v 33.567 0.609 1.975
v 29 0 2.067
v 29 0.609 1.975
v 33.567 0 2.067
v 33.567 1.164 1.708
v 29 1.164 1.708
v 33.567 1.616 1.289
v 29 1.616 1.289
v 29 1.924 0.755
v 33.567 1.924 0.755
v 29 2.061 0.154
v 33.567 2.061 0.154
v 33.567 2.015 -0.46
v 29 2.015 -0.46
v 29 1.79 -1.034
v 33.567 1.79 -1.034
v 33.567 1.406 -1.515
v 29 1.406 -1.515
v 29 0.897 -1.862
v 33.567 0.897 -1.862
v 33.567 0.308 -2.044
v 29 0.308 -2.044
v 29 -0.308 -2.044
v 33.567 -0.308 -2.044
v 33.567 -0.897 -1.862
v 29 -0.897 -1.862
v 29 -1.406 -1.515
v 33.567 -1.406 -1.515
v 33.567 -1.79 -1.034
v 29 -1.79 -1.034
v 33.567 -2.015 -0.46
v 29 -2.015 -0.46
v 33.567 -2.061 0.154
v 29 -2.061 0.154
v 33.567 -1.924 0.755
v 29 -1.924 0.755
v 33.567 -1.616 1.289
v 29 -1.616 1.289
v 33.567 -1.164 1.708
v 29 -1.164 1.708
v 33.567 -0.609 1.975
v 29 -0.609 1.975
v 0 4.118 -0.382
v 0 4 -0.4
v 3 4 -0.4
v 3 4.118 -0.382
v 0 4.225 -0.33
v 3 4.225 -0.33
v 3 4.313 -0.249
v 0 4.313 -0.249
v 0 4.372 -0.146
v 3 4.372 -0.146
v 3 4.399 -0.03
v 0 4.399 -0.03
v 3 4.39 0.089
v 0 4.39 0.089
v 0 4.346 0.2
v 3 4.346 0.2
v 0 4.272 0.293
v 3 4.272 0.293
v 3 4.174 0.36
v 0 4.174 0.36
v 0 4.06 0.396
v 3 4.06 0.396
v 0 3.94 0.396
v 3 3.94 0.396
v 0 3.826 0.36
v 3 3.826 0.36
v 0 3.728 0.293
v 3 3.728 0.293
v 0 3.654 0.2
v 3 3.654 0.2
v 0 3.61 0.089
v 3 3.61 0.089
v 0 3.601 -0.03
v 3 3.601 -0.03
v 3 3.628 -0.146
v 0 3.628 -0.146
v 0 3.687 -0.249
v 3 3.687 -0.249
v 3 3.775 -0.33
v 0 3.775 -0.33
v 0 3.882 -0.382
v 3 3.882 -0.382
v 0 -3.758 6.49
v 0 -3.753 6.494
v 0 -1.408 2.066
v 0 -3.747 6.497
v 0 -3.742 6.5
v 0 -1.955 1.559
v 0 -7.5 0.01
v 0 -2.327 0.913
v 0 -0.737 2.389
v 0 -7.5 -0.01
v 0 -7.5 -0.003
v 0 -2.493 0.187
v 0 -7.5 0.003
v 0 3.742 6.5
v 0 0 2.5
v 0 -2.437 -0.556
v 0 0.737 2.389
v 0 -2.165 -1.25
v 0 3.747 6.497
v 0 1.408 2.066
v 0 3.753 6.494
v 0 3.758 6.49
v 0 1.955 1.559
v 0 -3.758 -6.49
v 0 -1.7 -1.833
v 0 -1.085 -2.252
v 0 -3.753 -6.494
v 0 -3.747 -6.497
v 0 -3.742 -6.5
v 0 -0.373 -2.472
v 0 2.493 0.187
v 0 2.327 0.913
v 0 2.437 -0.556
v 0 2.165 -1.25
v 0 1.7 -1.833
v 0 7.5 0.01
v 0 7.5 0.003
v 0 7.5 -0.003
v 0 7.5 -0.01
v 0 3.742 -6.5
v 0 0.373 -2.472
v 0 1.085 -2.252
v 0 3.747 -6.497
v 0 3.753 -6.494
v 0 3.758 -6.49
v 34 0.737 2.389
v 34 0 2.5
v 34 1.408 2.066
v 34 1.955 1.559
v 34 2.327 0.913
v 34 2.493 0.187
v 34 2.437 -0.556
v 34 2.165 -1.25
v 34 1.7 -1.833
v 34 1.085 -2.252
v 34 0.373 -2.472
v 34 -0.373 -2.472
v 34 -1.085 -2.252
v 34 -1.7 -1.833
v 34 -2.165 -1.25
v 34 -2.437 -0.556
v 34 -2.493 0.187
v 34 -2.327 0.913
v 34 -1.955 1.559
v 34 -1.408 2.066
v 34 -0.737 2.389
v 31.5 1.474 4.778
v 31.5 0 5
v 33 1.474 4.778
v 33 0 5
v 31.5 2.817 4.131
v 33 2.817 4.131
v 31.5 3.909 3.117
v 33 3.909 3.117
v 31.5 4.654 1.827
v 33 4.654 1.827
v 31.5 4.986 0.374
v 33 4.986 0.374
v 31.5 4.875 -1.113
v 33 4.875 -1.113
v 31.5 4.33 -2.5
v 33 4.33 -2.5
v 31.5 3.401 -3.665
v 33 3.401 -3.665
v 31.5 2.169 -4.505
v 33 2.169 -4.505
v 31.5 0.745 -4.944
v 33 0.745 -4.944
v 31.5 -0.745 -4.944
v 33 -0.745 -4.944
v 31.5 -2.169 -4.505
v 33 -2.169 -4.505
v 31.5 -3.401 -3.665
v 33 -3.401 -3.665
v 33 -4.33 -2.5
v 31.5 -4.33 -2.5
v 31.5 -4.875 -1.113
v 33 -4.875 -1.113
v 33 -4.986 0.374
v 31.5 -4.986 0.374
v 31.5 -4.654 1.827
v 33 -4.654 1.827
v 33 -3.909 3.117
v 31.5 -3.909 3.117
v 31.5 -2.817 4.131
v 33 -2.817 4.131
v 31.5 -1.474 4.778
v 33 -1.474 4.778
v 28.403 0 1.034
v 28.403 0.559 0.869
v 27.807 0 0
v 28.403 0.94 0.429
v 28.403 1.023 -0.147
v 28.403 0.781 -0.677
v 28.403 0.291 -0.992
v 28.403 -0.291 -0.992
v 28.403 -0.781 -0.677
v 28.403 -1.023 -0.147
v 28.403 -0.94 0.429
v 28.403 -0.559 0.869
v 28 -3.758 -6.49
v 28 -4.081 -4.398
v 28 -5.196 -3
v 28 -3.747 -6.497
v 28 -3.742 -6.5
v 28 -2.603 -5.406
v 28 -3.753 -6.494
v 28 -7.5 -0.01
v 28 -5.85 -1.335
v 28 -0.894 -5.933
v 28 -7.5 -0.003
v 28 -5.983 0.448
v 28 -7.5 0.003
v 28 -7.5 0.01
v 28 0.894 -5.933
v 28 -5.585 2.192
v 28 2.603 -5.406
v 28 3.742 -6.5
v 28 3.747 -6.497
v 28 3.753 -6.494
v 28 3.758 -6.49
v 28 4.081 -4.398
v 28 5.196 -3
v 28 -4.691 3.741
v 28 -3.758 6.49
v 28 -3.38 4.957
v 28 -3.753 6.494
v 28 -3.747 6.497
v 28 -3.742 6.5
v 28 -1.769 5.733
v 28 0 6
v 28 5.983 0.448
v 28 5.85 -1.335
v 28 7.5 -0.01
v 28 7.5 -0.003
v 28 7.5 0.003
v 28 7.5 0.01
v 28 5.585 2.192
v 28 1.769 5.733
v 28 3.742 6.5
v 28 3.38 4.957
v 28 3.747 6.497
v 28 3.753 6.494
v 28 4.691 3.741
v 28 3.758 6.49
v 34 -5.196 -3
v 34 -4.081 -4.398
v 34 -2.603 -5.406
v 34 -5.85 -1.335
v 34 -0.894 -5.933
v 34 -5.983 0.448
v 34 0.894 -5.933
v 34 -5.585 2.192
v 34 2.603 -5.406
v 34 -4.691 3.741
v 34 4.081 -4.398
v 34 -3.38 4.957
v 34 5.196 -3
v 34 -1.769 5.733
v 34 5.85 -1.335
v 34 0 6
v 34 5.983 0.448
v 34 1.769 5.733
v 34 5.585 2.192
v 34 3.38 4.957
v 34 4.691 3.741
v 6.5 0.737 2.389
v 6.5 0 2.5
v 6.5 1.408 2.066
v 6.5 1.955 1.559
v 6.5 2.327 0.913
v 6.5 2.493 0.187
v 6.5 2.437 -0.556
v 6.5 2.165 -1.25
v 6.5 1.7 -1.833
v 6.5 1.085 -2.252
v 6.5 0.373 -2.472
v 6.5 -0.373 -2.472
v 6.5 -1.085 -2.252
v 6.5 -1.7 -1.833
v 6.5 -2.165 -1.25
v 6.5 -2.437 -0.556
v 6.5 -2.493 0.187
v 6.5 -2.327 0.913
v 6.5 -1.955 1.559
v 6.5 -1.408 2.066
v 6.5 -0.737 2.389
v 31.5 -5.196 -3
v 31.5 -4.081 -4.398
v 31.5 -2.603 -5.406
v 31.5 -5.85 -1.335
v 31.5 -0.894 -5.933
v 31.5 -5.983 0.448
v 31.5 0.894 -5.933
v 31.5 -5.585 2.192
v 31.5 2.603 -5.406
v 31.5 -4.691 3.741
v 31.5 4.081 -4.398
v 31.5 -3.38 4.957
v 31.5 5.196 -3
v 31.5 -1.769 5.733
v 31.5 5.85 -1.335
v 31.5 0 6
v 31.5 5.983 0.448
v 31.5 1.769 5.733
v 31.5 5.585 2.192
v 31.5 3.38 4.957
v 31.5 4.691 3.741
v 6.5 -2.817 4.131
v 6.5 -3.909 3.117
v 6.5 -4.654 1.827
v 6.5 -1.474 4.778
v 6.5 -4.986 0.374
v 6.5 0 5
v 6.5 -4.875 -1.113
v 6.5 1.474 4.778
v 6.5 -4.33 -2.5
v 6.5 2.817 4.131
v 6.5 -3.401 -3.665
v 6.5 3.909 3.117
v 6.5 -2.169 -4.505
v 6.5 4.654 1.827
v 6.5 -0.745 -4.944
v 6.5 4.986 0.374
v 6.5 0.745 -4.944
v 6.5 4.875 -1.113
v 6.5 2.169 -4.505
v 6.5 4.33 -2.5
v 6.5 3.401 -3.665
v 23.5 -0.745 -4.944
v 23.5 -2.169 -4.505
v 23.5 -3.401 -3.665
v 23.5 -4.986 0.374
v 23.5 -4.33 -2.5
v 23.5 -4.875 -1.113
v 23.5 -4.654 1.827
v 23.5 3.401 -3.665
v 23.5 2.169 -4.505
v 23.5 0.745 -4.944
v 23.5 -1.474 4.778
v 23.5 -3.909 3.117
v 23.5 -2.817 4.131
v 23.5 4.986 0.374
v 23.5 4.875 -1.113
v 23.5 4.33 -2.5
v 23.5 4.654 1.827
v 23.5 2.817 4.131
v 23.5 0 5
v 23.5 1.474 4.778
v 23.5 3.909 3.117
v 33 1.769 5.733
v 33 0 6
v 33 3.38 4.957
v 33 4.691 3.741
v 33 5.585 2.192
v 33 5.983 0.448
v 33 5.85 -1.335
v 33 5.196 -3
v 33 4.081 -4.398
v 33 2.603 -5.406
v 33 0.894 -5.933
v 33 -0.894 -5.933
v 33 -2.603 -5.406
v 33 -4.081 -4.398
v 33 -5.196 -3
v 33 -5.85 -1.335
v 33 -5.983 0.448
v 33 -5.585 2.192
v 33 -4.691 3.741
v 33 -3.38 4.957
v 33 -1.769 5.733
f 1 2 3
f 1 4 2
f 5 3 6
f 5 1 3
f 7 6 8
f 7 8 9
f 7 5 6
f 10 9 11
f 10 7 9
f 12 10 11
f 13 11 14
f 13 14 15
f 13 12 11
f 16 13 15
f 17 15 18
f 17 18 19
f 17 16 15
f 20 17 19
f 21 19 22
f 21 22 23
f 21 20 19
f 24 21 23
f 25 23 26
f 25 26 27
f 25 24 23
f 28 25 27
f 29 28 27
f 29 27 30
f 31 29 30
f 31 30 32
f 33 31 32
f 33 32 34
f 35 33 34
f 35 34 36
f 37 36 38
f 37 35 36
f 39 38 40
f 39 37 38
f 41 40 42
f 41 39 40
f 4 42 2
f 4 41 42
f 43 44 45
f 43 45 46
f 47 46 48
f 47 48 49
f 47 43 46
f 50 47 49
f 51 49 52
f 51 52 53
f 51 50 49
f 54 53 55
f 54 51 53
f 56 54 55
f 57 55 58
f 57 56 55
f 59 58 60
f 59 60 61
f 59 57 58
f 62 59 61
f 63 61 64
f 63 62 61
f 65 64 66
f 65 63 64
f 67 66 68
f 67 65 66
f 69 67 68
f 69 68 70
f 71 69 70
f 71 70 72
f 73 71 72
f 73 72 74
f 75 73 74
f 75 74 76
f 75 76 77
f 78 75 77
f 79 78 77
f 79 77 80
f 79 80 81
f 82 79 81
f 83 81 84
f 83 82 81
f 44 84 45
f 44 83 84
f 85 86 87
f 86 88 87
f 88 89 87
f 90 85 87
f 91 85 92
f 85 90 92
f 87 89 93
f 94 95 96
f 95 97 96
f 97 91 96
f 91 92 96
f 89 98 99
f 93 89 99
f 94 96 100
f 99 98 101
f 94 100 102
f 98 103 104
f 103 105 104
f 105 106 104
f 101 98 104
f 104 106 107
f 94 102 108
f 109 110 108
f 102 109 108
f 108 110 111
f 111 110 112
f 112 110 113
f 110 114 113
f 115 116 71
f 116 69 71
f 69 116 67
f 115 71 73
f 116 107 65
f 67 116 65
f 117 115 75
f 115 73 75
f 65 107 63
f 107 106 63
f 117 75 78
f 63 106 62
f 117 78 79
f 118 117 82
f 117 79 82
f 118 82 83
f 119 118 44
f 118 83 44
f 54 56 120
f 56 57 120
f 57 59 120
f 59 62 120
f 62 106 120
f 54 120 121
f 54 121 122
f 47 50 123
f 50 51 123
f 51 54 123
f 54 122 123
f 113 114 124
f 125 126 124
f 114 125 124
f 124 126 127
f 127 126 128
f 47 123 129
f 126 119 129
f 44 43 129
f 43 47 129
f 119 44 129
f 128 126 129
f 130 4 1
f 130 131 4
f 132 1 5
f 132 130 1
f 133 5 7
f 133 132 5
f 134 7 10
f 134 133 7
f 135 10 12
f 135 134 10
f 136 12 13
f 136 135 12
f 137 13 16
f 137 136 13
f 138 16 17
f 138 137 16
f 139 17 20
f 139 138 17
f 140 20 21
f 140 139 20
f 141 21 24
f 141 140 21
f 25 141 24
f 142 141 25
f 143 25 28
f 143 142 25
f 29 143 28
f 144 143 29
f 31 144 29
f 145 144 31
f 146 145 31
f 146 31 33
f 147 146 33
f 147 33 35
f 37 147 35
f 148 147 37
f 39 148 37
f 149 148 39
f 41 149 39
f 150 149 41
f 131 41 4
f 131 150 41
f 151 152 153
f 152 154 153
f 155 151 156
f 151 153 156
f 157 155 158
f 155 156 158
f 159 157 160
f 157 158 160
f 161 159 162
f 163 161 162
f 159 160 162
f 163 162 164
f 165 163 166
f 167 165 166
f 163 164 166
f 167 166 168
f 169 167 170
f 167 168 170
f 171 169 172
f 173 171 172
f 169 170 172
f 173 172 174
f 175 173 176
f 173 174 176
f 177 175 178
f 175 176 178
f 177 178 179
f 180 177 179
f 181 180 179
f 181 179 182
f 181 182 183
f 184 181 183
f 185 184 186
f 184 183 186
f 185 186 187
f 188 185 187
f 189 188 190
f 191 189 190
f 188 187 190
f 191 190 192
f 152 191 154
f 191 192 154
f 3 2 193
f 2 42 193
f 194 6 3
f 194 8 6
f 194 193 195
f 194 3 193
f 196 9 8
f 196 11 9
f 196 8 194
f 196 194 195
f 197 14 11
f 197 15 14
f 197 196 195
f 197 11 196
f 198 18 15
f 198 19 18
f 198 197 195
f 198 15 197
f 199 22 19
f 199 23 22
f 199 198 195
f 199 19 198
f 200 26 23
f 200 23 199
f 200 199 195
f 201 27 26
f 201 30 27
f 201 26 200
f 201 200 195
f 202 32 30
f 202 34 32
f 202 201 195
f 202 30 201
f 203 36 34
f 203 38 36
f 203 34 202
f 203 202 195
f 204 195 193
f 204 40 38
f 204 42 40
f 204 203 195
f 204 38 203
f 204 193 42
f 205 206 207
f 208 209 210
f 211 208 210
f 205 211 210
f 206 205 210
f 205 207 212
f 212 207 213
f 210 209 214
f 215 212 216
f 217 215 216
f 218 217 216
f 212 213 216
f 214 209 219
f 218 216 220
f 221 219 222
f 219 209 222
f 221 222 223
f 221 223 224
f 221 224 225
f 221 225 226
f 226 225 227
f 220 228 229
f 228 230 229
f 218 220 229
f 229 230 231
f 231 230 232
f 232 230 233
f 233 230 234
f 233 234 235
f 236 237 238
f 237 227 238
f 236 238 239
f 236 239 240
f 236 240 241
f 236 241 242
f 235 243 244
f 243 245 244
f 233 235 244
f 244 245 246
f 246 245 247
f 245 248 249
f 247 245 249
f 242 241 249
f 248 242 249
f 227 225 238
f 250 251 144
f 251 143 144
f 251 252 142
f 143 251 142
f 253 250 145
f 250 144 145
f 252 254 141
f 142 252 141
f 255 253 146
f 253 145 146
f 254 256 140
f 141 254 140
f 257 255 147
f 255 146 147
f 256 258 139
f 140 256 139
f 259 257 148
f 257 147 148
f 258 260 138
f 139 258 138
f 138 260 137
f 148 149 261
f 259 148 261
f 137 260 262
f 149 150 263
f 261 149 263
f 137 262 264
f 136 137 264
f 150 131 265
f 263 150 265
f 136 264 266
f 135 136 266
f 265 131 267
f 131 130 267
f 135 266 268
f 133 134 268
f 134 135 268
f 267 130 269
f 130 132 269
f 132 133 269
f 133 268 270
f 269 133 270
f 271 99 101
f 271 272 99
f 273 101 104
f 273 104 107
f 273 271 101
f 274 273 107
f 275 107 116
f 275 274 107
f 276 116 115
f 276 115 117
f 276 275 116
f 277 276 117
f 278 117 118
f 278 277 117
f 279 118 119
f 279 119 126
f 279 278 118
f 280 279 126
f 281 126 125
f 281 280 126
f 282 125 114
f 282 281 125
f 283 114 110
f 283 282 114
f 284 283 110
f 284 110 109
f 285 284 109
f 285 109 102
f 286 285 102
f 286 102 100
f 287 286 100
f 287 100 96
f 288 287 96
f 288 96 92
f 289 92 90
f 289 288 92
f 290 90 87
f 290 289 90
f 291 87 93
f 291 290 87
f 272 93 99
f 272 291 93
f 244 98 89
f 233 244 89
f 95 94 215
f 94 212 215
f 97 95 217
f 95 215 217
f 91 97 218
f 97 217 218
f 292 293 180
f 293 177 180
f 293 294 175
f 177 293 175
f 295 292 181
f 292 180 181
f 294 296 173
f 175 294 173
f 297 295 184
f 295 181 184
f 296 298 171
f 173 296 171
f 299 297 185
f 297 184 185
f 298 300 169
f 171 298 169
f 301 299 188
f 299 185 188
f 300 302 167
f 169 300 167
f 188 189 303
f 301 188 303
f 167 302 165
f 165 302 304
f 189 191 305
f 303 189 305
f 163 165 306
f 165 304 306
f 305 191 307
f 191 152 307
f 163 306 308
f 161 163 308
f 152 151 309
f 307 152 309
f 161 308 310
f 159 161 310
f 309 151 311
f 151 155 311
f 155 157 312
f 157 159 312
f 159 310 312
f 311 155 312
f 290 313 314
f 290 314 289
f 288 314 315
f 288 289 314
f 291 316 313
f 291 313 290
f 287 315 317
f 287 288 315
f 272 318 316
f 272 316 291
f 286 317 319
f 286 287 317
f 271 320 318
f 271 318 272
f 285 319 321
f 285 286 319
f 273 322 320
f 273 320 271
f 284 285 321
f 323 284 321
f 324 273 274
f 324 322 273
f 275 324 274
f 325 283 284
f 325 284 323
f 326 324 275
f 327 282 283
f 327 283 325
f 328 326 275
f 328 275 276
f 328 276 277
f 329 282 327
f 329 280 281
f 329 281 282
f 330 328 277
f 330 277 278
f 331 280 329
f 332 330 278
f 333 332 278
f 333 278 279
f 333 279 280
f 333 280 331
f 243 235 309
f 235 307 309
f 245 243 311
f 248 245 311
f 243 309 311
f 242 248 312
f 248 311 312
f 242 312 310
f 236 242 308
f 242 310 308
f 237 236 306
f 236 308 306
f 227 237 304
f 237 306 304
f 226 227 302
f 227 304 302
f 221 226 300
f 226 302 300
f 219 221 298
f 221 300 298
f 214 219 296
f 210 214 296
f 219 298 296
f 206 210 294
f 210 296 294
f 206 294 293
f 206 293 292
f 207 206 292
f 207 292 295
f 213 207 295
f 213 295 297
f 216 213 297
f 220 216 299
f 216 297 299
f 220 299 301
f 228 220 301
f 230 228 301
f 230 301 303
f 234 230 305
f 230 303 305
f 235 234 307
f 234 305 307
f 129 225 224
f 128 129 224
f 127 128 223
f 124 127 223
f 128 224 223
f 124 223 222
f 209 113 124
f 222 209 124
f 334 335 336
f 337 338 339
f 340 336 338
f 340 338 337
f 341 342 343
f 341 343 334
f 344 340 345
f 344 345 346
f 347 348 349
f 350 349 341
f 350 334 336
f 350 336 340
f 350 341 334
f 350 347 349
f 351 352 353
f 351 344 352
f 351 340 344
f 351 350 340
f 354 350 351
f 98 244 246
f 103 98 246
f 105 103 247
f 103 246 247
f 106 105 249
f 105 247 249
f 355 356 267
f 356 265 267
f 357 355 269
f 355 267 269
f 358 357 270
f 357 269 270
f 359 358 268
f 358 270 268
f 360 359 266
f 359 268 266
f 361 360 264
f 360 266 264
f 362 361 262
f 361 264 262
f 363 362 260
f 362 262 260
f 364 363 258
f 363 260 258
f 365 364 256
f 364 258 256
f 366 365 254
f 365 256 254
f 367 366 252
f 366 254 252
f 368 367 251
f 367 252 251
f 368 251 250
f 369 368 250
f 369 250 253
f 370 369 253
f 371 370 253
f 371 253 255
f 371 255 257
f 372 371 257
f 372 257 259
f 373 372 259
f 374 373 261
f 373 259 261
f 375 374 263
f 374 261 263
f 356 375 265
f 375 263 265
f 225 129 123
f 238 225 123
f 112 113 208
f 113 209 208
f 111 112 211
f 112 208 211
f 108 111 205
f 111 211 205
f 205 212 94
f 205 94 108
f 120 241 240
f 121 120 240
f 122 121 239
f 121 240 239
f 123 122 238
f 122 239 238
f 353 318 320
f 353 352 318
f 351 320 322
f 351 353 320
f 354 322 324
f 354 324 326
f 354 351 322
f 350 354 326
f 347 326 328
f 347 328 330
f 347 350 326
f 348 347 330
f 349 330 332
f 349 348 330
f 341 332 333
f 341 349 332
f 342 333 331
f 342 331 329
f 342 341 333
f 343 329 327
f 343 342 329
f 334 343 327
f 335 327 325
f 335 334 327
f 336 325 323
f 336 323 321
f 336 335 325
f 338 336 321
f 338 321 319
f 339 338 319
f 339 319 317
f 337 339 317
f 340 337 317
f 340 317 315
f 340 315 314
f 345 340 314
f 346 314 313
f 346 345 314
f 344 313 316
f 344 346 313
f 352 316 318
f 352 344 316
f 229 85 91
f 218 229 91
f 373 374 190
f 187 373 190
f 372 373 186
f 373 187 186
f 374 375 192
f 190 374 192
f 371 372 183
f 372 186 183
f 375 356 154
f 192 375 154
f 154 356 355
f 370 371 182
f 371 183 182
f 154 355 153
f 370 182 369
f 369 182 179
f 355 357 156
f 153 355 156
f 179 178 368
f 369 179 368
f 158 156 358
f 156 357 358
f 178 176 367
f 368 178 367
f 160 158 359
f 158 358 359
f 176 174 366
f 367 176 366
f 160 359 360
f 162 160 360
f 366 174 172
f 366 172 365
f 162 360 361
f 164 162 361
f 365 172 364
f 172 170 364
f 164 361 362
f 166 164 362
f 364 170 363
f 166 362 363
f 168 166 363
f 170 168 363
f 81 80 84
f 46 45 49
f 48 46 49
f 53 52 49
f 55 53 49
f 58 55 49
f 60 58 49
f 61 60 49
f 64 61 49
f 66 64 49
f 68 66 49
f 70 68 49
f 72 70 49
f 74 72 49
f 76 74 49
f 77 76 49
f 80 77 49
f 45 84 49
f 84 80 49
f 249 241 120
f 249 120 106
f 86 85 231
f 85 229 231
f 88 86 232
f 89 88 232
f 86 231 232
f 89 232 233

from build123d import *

# Parameters (mm, degrees)
SKETCH_4_R          = 23.958779716
CUT_EXTRUDE_1_DEPTH = 28
SKETCH_5_R          = 0.4
CUT_EXTRUDE_2_DEPTH = 3


with BuildPart() as part:
    # 草图1 → 旋转1 (revolve)
    with BuildSketch(Plane.XY, mode=Mode.PRIVATE) as revolve_1_sk:
        Polygon((0, 0), (0, 7.5), (28, 7.5), (28, 6), (31.5, 6), (31.5, 5), (33, 5), (33, 6), (34, 6), (34, 0), align=None)
    revolve(revolve_1_sk.sketch.rotate(Axis((34, 0, 0), (-1, 0, 0)), 270), axis=Axis((34, 0, 0), (-1, 0, 0)))

    # 草图2 → 切除-旋转1 (revolve, cut)
    with BuildSketch(Plane.XY, mode=Mode.PRIVATE) as cut_revolve_1_sk:
        Polygon((0, 0), (0, 2.5), (6.5, 2.5), (6.5, 5), (23.5, 5), (23.5, 0), align=None)
    revolve(cut_revolve_1_sk.sketch.rotate(Axis((23.5, 0, 0), (-1, 0, 0)), 270), axis=Axis((23.5, 0, 0), (-1, 0, 0)), mode=Mode.SUBTRACT)

    # 草图3 → 切除-旋转2 (revolve, cut)
    with BuildSketch(Plane.XY, mode=Mode.PRIVATE) as cut_revolve_2_sk:
        Polygon((27.806616994, 0), (29, 2.067), (33.567, 2.067), (34, 2.5), (34, 0), align=None)
    revolve(cut_revolve_2_sk.sketch.rotate(Axis((34, 0, 0), (-1, 0, 0)), 270), axis=Axis((34, 0, 0), (-1, 0, 0)), mode=Mode.SUBTRACT)

    # 草图4 → 切除-拉伸1 (cut)
    with BuildSketch(Plane(origin=(0, 0, 0), x_dir=(0, 0, -1), z_dir=(1, 0, 0))):
        Circle(SKETCH_4_R)
        Polygon((-6.5, -3.75277675), (0, -7.505553499), (6.5, -3.75277675), (6.5, 3.75277675), (0, 7.505553499), (-6.5, 3.75277675), align=None, mode=Mode.SUBTRACT)
    extrude(amount=CUT_EXTRUDE_1_DEPTH, mode=Mode.SUBTRACT)

    # 草图5 → 切除-拉伸2 (cut)
    with BuildSketch(Plane(origin=(0, 0, 0), x_dir=(0, 0, -1), z_dir=(1, 0, 0))):
        with Locations((0, 4)):
            Circle(SKETCH_5_R)
    extrude(amount=CUT_EXTRUDE_2_DEPTH, mode=Mode.SUBTRACT)


solid = part.part
